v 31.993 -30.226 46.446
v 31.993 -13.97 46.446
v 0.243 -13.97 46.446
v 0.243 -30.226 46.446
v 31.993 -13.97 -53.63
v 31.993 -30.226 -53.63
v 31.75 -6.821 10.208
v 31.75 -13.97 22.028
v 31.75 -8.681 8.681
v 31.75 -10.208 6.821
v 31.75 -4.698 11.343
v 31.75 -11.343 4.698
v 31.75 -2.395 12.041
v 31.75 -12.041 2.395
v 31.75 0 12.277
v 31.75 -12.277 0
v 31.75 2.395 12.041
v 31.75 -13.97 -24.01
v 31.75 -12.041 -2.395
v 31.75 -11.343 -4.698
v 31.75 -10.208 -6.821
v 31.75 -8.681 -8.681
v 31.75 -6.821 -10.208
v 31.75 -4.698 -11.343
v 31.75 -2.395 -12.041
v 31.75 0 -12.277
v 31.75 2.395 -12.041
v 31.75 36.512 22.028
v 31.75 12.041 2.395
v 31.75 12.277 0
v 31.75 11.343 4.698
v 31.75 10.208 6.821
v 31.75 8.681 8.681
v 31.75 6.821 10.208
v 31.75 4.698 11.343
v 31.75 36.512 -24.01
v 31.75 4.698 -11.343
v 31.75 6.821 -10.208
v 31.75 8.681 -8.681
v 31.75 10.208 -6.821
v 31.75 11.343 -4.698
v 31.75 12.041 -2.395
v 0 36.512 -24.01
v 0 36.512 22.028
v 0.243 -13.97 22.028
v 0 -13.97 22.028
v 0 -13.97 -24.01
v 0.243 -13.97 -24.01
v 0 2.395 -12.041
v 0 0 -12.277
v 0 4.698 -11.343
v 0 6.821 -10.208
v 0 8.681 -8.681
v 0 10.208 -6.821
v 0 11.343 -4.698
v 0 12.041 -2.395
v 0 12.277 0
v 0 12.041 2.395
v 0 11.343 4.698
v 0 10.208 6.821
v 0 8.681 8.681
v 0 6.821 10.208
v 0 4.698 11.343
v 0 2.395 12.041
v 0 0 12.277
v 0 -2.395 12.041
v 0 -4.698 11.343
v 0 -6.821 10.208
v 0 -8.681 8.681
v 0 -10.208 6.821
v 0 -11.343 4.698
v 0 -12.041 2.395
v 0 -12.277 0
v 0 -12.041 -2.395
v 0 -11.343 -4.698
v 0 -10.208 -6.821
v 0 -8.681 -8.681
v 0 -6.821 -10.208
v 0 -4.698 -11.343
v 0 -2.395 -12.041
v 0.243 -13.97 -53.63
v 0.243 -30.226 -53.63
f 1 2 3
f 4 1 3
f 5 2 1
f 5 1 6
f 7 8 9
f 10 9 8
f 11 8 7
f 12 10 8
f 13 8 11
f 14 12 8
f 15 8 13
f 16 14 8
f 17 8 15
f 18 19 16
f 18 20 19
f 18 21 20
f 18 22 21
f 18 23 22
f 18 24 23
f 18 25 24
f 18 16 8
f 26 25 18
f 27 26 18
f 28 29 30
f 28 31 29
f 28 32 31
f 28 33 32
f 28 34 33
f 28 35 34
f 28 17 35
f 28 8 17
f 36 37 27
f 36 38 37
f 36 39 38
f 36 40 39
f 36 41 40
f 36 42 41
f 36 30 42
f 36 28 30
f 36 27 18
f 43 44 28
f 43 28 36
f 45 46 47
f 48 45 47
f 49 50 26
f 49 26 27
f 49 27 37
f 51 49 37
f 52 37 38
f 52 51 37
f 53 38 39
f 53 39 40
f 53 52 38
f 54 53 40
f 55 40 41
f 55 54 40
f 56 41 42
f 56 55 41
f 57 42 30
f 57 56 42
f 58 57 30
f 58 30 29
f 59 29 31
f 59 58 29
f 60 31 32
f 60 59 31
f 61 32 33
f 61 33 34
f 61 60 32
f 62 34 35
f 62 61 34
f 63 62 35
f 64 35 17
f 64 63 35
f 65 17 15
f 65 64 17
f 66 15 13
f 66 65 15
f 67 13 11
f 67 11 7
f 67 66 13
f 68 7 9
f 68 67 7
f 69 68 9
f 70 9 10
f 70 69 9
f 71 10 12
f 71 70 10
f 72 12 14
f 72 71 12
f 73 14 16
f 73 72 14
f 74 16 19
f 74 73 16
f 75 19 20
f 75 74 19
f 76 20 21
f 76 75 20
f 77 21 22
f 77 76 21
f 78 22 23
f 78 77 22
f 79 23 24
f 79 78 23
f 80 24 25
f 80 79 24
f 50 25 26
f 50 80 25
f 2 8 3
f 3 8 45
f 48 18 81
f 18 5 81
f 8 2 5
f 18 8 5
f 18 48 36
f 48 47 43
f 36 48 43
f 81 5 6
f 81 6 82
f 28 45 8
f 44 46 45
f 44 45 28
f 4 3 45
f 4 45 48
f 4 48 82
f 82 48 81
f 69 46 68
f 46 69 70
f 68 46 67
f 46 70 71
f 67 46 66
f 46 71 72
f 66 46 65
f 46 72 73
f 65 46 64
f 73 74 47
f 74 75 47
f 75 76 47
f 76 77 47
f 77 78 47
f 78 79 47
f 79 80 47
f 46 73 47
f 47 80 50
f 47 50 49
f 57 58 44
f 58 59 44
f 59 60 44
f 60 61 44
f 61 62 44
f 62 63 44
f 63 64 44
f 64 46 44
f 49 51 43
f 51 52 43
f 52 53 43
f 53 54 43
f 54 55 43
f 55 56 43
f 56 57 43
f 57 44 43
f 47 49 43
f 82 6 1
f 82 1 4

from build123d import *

# Parameters (mm, degrees)
SKETCH1_W           = 46.0375
SKETCH1_H           = 50.4825
SKETCH1_R           = 12.277280792
BOSS_EXTRUDE1_DEPTH = 31.75
SKETCH3_W           = 31.75
SKETCH3_H           = 100.076
BOSS_EXTRUDE3_DEPTH = 16.256


with BuildPart() as part:
    # Sketch1 → Boss-Extrude1 (new body)
    with BuildSketch(Plane(origin=(0, 0, 0), x_dir=(0, 0, -1), z_dir=(1, 0, 0))):
        with Locations((0.991238038, 11.27125)):
            Rectangle(SKETCH1_W, SKETCH1_H)
        Circle(SKETCH1_R, mode=Mode.SUBTRACT)
    extrude(amount=BOSS_EXTRUDE1_DEPTH)

    # Sketch3 → Boss-Extrude3 (add)
    with BuildSketch(Plane(origin=(0, -13.97, 0), x_dir=(-1, 0, 0), z_dir=(0, -1, 0))):
        with Locations((-16.117688266, 3.592032026)):
            Rectangle(SKETCH3_W, SKETCH3_H)
    extrude(amount=BOSS_EXTRUDE3_DEPTH)


solid = part.part
